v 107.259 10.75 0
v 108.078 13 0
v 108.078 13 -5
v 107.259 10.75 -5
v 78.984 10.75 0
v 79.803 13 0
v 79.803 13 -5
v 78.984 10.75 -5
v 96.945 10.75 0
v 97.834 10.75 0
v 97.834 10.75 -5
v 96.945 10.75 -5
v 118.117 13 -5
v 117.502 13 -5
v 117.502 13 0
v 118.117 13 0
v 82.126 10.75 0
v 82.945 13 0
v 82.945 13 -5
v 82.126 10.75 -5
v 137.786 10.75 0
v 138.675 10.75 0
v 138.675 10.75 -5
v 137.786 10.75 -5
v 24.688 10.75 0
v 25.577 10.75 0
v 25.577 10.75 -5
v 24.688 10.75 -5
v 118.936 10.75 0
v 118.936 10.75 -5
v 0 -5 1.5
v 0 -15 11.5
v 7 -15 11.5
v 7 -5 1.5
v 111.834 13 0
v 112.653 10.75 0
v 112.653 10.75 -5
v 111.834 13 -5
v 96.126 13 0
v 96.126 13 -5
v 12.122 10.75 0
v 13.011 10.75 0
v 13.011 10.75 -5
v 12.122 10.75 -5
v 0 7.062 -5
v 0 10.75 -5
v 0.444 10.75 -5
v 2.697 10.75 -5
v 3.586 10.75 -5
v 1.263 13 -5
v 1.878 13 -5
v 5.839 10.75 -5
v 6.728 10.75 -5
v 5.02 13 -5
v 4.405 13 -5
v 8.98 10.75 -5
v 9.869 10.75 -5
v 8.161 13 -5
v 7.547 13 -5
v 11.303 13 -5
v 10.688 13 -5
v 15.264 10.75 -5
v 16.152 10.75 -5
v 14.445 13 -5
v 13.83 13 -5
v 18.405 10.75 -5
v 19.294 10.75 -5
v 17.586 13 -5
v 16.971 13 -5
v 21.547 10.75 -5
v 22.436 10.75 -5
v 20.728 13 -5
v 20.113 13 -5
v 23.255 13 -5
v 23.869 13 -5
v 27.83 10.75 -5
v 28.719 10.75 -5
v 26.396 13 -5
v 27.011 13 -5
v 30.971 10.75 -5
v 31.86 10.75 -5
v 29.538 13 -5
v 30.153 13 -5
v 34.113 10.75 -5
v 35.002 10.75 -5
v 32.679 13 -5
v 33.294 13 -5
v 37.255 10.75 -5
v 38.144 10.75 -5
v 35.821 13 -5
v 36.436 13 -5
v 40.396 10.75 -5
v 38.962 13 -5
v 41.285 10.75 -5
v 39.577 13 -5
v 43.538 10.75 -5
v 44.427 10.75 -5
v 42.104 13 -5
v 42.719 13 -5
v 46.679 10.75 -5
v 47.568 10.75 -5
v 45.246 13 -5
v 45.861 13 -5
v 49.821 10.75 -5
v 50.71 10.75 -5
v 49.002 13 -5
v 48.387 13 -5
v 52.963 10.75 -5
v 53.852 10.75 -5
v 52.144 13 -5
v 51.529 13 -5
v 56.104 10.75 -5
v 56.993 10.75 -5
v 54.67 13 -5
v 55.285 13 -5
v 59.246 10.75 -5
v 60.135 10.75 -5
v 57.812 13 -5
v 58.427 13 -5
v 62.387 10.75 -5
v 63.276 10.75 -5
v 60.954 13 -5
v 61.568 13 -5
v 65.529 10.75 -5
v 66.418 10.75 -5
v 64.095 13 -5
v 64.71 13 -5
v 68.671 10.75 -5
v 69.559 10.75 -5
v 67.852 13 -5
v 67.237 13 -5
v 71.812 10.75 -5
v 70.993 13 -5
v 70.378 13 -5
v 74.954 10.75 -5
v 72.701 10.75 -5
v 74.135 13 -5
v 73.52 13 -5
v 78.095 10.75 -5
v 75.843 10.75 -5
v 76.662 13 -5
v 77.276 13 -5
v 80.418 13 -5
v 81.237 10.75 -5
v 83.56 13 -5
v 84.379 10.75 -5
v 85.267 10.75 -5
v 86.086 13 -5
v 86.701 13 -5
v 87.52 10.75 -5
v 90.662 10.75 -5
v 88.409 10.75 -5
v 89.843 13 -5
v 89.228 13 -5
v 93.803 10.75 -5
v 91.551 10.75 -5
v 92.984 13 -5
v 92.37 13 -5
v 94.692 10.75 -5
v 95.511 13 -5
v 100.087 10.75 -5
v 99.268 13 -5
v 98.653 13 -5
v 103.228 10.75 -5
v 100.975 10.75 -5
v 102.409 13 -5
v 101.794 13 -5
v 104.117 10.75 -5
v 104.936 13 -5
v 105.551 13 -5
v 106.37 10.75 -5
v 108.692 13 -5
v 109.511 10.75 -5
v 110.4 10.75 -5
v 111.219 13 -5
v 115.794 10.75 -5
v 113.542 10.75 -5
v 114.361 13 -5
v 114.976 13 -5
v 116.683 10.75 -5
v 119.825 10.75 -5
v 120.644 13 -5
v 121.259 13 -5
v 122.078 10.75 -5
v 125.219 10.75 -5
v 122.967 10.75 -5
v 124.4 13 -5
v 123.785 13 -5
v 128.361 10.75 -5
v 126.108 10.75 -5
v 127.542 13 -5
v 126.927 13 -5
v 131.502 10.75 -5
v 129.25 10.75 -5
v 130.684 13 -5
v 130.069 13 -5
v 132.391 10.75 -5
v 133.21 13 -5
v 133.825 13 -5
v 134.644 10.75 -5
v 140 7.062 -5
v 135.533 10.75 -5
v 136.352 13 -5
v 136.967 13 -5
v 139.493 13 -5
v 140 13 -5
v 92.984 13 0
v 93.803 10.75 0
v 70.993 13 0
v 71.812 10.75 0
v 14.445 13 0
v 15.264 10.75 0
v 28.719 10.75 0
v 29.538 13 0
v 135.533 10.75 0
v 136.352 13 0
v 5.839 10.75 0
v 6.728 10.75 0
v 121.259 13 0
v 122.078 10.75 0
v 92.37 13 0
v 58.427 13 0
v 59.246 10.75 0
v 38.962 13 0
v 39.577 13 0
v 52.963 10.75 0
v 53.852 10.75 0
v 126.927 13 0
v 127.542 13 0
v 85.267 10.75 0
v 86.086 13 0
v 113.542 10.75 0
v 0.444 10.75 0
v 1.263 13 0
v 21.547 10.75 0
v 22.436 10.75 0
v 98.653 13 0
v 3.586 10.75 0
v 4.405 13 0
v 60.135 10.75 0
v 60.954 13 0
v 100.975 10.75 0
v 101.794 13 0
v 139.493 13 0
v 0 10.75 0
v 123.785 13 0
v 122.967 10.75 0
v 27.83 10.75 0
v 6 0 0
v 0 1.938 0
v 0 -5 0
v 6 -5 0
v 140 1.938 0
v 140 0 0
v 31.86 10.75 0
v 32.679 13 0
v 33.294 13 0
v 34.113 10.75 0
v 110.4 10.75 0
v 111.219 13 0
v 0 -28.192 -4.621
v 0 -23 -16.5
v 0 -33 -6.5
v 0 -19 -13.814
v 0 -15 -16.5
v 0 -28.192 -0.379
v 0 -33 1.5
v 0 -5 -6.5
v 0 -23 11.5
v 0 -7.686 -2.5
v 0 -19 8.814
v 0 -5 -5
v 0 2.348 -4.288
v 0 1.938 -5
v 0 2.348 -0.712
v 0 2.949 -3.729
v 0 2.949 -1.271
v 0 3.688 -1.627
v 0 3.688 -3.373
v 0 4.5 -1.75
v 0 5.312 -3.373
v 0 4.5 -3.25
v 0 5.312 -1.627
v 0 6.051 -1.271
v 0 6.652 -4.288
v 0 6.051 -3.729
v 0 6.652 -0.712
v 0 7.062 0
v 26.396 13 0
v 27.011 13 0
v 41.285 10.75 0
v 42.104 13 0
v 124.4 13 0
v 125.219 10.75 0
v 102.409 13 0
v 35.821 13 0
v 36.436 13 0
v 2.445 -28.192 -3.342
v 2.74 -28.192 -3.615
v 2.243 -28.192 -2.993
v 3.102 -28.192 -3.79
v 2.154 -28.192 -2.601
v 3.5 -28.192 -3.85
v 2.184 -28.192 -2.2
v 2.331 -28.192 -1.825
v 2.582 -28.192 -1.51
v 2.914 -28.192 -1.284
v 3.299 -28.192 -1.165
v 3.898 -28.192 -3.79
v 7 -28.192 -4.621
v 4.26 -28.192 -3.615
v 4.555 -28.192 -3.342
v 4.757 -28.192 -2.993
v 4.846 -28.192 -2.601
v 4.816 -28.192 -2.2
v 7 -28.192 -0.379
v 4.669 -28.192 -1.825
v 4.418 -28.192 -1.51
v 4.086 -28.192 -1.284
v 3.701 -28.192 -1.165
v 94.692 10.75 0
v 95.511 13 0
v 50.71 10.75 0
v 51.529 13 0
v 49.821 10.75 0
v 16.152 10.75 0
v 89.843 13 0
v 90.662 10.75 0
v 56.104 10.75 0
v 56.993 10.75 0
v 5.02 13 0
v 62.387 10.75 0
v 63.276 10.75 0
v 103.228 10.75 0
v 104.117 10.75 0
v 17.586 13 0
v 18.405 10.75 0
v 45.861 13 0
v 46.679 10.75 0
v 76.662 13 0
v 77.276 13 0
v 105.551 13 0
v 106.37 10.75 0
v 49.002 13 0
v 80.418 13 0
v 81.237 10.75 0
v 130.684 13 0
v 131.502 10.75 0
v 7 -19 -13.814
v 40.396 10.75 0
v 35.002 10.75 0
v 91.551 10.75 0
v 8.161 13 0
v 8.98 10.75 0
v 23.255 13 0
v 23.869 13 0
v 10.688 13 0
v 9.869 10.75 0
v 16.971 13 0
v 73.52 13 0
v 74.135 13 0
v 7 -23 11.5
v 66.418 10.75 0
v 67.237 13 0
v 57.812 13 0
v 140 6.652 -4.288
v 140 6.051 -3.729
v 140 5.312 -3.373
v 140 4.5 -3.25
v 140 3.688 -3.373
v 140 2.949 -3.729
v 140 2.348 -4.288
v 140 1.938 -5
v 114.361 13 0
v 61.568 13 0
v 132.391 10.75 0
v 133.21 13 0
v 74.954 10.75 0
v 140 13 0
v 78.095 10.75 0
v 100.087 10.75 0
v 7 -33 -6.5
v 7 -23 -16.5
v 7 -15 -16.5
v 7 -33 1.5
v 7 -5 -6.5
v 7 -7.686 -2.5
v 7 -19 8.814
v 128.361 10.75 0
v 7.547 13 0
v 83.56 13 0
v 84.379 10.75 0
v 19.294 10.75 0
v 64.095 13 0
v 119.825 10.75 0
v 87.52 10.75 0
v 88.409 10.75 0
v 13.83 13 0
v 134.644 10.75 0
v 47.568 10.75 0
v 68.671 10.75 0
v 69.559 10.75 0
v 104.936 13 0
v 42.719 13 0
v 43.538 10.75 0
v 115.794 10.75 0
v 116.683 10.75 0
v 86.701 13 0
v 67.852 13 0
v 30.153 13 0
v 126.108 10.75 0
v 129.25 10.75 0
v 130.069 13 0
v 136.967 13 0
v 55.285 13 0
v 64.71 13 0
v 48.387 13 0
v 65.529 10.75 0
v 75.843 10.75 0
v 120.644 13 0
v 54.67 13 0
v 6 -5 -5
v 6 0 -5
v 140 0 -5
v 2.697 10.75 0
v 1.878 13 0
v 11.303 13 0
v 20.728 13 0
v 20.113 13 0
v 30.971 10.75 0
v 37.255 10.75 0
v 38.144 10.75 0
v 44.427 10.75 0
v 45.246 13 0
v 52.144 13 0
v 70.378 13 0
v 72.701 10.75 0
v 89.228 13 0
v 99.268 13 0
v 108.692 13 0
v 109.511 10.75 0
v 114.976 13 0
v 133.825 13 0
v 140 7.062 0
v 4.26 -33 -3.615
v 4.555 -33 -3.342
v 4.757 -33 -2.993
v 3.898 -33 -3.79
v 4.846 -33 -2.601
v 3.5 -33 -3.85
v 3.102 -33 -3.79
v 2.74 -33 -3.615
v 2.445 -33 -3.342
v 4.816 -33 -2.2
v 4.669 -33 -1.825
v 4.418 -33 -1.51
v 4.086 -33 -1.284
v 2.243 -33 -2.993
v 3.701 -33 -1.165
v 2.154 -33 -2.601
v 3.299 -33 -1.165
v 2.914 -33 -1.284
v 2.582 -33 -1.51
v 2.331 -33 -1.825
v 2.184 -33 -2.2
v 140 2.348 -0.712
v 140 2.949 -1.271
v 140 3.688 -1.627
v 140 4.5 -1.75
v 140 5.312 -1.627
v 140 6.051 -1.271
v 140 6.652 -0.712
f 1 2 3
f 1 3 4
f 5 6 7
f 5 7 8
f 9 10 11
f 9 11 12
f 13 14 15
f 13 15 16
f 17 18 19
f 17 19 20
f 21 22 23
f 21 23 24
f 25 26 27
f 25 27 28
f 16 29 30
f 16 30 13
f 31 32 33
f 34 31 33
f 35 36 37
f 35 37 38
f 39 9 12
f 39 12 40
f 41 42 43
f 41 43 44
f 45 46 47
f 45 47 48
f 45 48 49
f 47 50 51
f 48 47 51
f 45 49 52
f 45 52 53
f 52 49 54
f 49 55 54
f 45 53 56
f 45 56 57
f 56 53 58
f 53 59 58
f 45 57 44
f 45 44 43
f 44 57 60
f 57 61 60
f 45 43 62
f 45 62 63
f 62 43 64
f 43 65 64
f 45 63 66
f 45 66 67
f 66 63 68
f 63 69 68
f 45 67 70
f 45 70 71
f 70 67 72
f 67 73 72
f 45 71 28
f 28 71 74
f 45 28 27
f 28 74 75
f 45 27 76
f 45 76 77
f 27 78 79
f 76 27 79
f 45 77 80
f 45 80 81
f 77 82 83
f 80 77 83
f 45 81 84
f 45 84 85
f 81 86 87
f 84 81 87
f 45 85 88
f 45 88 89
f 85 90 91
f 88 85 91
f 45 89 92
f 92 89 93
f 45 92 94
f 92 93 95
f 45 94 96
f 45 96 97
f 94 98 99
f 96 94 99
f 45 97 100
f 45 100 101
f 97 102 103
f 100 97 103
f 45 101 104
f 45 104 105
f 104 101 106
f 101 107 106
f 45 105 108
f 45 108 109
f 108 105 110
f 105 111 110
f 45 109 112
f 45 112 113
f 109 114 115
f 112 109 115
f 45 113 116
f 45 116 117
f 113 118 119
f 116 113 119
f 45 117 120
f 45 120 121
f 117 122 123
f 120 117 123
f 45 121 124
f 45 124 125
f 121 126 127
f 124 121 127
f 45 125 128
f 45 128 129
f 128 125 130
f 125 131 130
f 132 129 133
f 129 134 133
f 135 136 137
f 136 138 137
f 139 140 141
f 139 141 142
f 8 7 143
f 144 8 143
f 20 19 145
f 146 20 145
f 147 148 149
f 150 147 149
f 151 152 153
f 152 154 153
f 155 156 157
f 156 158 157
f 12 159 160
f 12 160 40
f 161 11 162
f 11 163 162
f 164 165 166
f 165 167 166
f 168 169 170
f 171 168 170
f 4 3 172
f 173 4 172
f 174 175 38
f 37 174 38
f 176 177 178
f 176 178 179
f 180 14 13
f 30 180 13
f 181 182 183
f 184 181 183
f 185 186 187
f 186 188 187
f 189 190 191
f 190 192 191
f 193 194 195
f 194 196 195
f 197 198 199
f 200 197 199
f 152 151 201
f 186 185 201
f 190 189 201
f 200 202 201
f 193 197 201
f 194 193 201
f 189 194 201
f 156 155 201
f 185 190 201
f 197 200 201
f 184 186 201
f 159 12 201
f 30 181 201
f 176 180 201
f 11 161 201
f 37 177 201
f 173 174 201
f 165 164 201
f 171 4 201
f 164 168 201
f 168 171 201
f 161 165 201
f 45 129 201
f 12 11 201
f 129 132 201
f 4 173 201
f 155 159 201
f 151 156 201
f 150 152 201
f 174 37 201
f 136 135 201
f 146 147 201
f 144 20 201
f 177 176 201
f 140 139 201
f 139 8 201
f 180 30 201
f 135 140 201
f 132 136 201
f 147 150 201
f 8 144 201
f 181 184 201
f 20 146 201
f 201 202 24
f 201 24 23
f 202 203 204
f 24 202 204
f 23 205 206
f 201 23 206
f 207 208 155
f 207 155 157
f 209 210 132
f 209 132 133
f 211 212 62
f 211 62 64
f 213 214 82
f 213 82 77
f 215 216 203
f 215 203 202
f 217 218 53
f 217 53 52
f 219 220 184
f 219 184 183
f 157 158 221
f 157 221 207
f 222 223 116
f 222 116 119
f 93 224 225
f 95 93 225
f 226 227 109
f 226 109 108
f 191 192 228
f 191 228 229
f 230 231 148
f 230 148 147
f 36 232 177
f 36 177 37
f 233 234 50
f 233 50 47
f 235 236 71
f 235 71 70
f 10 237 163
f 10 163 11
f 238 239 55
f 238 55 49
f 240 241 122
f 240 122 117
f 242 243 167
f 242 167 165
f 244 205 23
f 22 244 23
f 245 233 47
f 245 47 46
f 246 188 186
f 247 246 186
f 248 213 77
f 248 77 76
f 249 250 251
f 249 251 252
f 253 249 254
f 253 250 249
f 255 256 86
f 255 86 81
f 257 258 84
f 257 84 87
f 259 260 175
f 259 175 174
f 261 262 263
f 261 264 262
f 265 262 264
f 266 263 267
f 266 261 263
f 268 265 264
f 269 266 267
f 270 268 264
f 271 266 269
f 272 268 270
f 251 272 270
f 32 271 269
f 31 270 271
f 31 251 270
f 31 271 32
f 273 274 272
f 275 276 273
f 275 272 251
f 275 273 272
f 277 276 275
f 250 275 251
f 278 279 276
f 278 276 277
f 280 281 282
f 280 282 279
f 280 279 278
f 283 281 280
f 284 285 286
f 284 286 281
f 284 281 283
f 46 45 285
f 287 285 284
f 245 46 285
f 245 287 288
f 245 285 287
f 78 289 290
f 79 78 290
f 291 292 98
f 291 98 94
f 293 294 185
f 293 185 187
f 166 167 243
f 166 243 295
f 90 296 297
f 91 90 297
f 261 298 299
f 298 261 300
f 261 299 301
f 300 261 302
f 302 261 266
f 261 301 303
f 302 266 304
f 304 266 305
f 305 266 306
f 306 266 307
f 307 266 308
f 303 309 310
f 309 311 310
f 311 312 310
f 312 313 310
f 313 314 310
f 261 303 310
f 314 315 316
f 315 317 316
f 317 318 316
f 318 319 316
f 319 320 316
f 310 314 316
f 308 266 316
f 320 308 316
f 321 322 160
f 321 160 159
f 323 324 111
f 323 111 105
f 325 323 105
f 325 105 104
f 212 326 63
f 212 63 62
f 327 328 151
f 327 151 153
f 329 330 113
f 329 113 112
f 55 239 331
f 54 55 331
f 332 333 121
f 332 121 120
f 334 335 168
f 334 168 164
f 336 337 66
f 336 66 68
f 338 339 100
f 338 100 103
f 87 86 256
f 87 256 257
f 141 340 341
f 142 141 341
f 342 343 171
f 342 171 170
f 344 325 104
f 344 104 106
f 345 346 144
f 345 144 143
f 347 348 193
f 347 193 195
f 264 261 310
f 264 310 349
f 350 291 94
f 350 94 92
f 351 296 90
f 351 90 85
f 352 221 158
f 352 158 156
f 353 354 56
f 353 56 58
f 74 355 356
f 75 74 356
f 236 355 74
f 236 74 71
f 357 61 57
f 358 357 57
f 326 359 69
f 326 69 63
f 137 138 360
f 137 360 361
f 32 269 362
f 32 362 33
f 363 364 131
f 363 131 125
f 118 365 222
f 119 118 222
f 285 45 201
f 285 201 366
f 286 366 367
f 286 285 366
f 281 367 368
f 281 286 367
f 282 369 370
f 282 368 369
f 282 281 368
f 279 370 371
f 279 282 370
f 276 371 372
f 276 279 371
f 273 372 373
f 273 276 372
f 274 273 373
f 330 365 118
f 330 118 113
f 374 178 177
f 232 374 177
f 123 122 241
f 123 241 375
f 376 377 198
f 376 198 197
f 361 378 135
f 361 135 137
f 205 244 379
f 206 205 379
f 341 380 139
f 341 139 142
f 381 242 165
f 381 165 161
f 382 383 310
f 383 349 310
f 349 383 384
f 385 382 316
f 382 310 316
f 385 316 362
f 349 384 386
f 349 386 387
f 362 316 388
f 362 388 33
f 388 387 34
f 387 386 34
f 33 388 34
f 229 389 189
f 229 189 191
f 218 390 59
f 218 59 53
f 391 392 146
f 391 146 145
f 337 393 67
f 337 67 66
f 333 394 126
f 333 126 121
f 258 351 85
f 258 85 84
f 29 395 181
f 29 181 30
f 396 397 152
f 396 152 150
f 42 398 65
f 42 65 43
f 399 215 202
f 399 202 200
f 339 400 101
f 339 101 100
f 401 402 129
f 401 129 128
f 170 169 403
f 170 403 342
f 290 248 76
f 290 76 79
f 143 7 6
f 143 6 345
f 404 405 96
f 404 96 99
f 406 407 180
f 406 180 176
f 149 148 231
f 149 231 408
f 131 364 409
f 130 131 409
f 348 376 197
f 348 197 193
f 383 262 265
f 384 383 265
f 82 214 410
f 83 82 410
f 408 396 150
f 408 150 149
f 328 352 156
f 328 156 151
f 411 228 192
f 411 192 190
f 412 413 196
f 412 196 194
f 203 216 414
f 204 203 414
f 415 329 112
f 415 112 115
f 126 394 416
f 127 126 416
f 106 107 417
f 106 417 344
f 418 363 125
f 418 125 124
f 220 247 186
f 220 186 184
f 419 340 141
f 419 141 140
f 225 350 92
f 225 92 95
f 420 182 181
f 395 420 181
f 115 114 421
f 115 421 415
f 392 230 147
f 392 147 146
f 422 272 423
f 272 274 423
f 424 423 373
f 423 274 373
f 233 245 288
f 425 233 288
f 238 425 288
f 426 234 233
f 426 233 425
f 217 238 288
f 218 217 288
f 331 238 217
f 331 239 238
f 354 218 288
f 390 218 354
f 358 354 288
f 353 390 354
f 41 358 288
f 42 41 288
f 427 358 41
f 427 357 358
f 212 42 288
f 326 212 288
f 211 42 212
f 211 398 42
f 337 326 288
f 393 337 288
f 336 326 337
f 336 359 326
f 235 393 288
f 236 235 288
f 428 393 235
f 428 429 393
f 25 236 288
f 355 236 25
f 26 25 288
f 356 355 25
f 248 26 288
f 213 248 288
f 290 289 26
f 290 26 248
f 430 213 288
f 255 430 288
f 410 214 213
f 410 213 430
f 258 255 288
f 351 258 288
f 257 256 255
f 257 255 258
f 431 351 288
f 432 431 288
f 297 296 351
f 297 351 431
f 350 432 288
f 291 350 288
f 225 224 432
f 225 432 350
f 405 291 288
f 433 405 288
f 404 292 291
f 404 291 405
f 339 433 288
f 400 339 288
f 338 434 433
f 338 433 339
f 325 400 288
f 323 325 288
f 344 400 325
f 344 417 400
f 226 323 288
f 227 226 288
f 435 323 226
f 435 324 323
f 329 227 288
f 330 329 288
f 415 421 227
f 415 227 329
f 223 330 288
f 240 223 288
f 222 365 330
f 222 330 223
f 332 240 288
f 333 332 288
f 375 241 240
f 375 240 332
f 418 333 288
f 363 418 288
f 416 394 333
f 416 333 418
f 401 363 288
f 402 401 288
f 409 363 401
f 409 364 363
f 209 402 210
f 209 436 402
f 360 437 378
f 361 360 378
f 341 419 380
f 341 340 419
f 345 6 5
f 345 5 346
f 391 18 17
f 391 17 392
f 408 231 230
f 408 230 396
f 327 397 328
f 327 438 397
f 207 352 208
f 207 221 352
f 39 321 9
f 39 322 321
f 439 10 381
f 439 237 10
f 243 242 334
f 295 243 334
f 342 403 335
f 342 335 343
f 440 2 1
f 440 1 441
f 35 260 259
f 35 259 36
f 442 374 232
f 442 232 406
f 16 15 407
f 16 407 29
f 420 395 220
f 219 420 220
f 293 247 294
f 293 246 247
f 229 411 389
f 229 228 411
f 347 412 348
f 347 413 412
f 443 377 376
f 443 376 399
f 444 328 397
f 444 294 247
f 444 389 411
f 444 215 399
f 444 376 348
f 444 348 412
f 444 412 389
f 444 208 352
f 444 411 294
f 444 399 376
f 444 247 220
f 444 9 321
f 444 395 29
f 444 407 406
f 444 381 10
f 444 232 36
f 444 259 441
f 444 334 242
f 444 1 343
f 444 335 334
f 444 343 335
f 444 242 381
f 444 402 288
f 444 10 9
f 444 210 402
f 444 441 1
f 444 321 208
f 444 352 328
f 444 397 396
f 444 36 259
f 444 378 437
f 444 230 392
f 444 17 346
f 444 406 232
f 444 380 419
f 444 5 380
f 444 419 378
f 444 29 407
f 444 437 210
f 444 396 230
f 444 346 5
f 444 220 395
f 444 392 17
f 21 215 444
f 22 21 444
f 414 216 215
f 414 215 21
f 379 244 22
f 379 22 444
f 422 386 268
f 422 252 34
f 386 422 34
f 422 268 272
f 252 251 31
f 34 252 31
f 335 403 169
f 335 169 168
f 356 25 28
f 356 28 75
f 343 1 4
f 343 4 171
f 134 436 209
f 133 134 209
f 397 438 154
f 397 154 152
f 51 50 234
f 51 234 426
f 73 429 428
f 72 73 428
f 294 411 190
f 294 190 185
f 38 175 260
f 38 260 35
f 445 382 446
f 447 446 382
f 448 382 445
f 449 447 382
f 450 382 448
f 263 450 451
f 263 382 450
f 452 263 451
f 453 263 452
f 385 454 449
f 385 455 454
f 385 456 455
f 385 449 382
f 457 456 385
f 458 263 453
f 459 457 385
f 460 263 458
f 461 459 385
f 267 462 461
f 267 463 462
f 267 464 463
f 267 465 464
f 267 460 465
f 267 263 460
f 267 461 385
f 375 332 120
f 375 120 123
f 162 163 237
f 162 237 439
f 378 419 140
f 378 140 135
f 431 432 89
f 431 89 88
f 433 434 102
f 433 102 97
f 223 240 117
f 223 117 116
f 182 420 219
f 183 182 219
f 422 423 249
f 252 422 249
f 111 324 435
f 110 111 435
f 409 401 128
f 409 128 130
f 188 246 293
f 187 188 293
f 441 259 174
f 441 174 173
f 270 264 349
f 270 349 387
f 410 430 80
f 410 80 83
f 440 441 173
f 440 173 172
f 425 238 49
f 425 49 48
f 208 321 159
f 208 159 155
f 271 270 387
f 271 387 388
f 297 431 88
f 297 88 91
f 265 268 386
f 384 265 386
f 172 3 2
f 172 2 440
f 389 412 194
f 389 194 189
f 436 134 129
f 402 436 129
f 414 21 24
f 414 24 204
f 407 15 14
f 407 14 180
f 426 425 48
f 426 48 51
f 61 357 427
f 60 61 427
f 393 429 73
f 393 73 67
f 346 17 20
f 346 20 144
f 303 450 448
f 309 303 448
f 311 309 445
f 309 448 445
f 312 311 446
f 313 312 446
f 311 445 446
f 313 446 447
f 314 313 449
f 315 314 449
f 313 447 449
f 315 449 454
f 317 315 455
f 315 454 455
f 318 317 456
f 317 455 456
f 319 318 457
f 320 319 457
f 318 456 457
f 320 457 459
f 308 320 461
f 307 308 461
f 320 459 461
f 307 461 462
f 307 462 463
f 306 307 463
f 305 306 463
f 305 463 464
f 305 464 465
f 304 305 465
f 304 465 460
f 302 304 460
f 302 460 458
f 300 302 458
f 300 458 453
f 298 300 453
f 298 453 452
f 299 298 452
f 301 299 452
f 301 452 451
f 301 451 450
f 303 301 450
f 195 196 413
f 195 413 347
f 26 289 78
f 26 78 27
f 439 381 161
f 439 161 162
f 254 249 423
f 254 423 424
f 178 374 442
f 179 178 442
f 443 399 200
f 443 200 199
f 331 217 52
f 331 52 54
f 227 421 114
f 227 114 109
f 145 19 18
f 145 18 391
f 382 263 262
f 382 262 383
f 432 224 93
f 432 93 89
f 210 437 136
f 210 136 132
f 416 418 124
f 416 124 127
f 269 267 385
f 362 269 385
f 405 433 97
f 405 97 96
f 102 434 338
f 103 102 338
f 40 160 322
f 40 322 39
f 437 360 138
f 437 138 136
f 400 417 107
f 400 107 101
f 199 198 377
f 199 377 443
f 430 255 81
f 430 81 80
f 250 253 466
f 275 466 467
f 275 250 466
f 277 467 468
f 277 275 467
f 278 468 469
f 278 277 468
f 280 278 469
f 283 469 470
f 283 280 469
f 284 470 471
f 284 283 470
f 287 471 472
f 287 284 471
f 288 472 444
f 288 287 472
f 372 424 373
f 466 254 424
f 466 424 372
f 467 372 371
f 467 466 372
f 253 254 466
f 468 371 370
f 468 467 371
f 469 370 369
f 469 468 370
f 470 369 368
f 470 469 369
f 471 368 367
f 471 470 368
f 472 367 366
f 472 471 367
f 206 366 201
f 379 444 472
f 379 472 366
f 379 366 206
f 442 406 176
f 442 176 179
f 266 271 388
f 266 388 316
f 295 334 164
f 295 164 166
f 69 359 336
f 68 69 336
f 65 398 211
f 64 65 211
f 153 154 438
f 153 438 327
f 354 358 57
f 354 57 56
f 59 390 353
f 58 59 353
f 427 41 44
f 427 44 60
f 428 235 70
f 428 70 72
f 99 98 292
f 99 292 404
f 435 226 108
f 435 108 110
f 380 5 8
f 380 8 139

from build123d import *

# Parameters (mm, degrees)
BLANKSKE_W              = 140
BLANKSKE_H              = 13
BLANK_DEPTH             = 5
TOOTHCUTSIM_DEPTH       = 141.691151108
TEETHCUTS_COUNT         = 45
TEETHCUTS_PITCH         = 3.14159265
SKETCH1_R               = 2.75
CUT_EXTRUDE2_DEPTH      = 141.691151108
CUT_EXTRUDE2_DEPTH_BACK = 10
SKETCH15_W              = 6
SKETCH15_H              = 5
BOSS_EXTRUDE4_DEPTH     = 5
SKETCH16_W              = 28
SKETCH16_H              = 28
BOSS_EXTRUDE5_DEPTH     = 7
CUT_EXTRUDE6_DEPTH      = 10
CHAMFER4_SIZE           = 3
CHAMFER5_SIZE           = 10
SKETCH18_R              = 1.35
CUT_EXTRUDE7_DEPTH      = 10


with BuildPart() as part:
    # BlankSke → Blank (new body)
    with BuildSketch(Plane.XY):
        with Locations((70, 6.5)):
            Rectangle(BLANKSKE_W, BLANKSKE_H)
    extrude(amount=-BLANK_DEPTH)

    # TooCutSkeSim → ToothCutSim (cut, through all)
    with BuildSketch(Plane.XY):
        Polygon((0.44443537, 10.75), (-0.44443537, 10.75), (-1.272613241, 13.0254), (1.272613241, 13.0254), align=None)
    toothcutsim = extrude(amount=-TOOTHCUTSIM_DEPTH, mode=Mode.SUBTRACT)

    # TeethCuts: ToothCutSim ×45
    with Locations(*[(i * TEETHCUTS_PITCH, 0, 0) for i in range(1, TEETHCUTS_COUNT)]):
        add(toothcutsim, mode=Mode.SUBTRACT)

    # Sketch1 → Cut-Extrude2 (cut, two sides)
    with BuildSketch(Plane(origin=(0, 0, 0), x_dir=(0, 0, -1), z_dir=(1, 0, 0))) as cut_extrude2_sk:
        with Locations((6, 4.5)):
            Circle(SKETCH1_R)
        with Locations((-1, 4.5)):
            Circle(SKETCH1_R)
    extrude(amount=CUT_EXTRUDE2_DEPTH, mode=Mode.SUBTRACT)
    extrude(cut_extrude2_sk.sketch, amount=-CUT_EXTRUDE2_DEPTH_BACK, mode=Mode.SUBTRACT)

    # Sketch15 → Boss-Extrude4 (add)
    with BuildSketch(Plane.XZ):
        with Locations((3, -2.5)):
            Rectangle(SKETCH15_W, SKETCH15_H)
    extrude(amount=BOSS_EXTRUDE4_DEPTH)

    # Sketch16 → Boss-Extrude5 (add)
    with BuildSketch(Plane.ZY):
        with Locations((-2.5, -19)):
            Rectangle(SKETCH16_W, SKETCH16_H)
    extrude(amount=-BOSS_EXTRUDE5_DEPTH)

    # Sketch17 → Cut-Extrude6 (cut)
    with BuildSketch(Plane.ZY):
        Polygon((-13.813708499, -19), (-2.5, -7.686291501), (8.813708499, -19), (-2.5, -30.313708499), align=None)
    extrude(amount=-CUT_EXTRUDE6_DEPTH, mode=Mode.SUBTRACT)

    # Chamfer4
    chamfer4_edges = [part.edges().sort_by_distance(p)[0] for p in [
        (3.5, -30.313708499, -2.5),
    ]]
    chamfer(chamfer4_edges, length=CHAMFER4_SIZE)

    # Chamfer5
    chamfer5_edges = [part.edges().sort_by_distance(p)[0] for p in [
        (3.5, -5, 11.5),
        (3.5, -33, 11.5),
        (3.5, -33, -16.5),
        (3.5, -5, -16.5),
    ]]
    chamfer(chamfer5_edges, length=CHAMFER5_SIZE)

    # Sketch18 → Cut-Extrude7 (cut)
    with BuildSketch(Plane.XZ.offset(33)):
        with Locations(Location((3.5, -2.5, 0), (0, 0, 270))):
            Circle(SKETCH18_R)
    extrude(amount=-CUT_EXTRUDE7_DEPTH, mode=Mode.SUBTRACT)


solid = part.part
